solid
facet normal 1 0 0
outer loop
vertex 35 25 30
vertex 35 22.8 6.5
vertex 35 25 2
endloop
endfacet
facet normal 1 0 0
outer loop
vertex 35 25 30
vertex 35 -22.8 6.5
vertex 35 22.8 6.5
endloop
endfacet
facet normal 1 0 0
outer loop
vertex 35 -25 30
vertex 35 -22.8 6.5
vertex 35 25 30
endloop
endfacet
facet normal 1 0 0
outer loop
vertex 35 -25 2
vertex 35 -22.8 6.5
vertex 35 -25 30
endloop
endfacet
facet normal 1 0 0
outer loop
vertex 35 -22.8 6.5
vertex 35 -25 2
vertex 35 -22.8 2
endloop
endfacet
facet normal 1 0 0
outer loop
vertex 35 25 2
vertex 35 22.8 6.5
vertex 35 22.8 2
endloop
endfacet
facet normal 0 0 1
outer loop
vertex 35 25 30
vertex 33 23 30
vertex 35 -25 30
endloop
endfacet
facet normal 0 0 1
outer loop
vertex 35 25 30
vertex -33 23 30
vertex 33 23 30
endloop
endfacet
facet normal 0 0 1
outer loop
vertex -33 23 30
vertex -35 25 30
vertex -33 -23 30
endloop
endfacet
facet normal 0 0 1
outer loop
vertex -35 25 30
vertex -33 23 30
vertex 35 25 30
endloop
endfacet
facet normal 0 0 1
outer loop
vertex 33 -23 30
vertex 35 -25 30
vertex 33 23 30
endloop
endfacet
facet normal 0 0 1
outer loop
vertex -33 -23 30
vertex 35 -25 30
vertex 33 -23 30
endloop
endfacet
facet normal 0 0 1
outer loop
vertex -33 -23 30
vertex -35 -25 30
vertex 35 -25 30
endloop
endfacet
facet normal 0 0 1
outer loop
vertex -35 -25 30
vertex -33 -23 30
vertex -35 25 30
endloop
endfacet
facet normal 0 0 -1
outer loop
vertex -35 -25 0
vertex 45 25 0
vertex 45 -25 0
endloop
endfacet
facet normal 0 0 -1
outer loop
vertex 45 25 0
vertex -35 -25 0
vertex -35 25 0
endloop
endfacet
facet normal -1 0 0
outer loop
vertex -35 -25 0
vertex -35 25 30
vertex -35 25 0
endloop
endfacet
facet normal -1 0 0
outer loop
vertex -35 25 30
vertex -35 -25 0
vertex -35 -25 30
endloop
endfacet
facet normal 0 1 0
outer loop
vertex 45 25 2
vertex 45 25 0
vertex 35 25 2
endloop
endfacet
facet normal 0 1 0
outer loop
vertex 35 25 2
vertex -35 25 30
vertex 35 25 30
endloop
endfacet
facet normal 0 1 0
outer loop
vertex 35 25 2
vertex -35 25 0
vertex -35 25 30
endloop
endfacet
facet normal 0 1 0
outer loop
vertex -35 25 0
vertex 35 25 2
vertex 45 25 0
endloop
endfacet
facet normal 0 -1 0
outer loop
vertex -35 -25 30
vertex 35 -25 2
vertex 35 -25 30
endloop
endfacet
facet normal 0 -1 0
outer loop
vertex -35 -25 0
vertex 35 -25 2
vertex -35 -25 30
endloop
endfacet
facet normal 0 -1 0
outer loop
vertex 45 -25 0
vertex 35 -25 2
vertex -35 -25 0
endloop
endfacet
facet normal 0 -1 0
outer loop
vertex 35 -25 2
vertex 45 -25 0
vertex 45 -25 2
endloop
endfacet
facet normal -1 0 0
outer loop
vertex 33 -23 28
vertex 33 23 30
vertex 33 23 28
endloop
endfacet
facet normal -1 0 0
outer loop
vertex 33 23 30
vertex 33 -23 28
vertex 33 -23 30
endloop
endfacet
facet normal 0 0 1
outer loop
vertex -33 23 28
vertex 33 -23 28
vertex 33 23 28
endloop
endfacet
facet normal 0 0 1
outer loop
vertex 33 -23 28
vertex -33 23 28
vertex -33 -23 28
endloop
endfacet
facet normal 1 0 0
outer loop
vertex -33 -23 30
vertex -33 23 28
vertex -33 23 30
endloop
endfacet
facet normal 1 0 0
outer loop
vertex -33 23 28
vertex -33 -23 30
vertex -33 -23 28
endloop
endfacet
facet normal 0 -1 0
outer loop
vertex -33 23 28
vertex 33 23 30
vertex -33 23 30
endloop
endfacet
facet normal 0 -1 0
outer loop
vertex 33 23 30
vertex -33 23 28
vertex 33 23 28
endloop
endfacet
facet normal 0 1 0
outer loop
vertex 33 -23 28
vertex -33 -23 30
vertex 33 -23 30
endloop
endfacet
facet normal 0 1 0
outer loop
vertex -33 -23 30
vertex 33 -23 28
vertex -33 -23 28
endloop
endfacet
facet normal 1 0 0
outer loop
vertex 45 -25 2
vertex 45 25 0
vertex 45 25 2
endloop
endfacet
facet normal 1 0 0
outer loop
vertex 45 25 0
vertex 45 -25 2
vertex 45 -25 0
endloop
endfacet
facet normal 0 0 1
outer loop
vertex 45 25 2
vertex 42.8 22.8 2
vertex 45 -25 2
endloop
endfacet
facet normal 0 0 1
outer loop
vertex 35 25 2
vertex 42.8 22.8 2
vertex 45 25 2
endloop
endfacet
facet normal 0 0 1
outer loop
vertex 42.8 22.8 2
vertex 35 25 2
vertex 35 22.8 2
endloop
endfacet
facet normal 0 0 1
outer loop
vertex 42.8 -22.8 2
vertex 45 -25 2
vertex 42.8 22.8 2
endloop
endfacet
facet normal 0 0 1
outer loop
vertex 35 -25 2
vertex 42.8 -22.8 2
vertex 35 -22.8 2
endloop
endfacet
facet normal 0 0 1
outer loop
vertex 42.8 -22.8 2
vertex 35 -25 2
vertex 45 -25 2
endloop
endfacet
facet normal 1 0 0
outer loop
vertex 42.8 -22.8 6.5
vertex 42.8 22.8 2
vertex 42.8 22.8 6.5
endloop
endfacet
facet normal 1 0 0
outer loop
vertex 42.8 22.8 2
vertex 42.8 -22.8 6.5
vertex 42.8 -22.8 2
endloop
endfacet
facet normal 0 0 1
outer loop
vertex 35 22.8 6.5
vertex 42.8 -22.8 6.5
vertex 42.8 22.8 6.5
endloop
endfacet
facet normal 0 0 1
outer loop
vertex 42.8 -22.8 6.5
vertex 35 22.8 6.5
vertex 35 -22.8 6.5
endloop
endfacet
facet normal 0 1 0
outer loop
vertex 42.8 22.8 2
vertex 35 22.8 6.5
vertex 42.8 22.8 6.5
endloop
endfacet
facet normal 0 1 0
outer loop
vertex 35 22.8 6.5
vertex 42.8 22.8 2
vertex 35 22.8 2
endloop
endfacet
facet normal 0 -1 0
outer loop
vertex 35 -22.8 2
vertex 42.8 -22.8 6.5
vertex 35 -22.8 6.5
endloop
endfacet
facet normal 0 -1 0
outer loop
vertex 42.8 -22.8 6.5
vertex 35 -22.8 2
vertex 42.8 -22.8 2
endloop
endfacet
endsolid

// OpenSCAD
// Two-part enclosure for a small electronics board (e.g. Arduino-based temperature logger)
// Print orientation: both parts lie on the bed (z = 0), side by side, with a 10 mm gap.
// They print together as one solid.

// ---------------- Parameters ----------------
box_x      = 70;    // box outer length (X)
box_y      = 50;    // box outer width (Y)
box_z      = 30;    // box outer height (Z)
wall       = 2;     // box wall thickness
floor      = 2;     // box floor thickness
lip_t      = 1.5;   // lid lip (wall) thickness
lip_h      = 4;     // lid lip height (from plate top)
lip_outer_x = 65.6; // outer size of lip in X
lip_outer_y = 45.6; // outer size of lip in Y
clearance  = 0.2;   // clearance between lip outer size and box opening (each side)
eps        = 0.5;   // overcut for clean boolean differences
gap        = 10;    // gap between the two printed parts

$fn = 64;

// Derived: box opening (inside dimensions)
opening_x = box_x - 2 * wall;   // 66
opening_y = box_y - 2 * wall;   // 46

// Check: lip outer size = opening - 2*clearance = 65.6 x 45.6 (matches spec)

// ---------------- Modules ----------------
module box() {
    difference() {
        translate([-box_x/2, -box_y/2, 0])
            cube([box_x, box_y, box_z]);
        // open top: cut away the top wall and floor above z = box_z - floor
        translate([-opening_x/2, -opening_y/2, box_z - floor])
            cube([opening_x, opening_y, floor + eps]);
    }
}

module lid() {
    // Plate lying on the bed, centred on origin in X/Y
    plate_t = 2;
    translate([-box_x/2, -box_y/2, 0])
        cube([box_x, box_y, plate_t]);
    // Lip printed upside down: a wall whose outer size is lip_outer_x/outer_y,
    // centred on the plate, so it slides into the box opening.
    translate([-lip_outer_x/2, -lip_outer_y/2, plate_t])
        cube([lip_outer_x, lip_outer_y, lip_h + eps]);
}

// ---------------- Assembly ----------------
union() {
    box();
    translate([gap, 0, 0])
        lid();
}
